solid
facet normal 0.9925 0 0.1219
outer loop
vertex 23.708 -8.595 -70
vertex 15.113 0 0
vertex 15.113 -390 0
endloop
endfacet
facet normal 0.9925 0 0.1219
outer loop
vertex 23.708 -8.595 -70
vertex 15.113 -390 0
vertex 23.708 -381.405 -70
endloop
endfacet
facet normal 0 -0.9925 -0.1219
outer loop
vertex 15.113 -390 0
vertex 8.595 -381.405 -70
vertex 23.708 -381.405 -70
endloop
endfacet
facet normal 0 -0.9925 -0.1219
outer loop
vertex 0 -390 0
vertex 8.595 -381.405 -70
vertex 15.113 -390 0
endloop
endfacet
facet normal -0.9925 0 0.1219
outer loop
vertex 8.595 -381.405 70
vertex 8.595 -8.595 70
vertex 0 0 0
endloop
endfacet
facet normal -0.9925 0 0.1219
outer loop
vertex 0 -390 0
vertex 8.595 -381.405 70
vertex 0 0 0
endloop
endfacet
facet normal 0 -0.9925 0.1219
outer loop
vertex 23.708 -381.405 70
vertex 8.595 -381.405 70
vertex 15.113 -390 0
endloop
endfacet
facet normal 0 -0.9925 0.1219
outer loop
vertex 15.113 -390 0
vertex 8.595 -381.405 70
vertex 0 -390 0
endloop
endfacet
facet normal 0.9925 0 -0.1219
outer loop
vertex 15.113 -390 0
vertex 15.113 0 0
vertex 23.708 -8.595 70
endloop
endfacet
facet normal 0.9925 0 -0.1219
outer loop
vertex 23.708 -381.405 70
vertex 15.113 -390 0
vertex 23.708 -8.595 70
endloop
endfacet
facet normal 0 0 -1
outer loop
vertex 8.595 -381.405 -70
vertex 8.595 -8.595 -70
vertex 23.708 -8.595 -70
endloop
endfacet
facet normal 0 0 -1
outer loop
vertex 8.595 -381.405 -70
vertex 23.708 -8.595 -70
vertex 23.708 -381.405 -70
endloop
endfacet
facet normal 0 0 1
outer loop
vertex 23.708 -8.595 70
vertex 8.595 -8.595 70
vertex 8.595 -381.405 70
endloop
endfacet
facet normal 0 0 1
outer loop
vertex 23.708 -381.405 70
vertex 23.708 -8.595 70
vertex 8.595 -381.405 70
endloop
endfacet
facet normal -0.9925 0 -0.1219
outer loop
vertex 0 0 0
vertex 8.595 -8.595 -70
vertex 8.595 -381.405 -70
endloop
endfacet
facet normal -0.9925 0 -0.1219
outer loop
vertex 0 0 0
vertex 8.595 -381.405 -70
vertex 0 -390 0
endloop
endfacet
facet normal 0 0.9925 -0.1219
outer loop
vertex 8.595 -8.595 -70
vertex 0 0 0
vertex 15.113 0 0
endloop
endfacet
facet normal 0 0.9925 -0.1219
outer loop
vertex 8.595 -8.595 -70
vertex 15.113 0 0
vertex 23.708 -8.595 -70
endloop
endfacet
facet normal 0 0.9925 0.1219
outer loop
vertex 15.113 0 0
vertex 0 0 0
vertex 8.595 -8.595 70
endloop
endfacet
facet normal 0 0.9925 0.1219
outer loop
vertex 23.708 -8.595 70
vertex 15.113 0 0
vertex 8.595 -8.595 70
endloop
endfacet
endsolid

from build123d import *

# Parameters (mm, degrees)
F1_DEPTH = 460
F3_DEPTH = 37.493171


with BuildPart() as f1:
    # F0 (on Front) → F1 (new body)
    with BuildSketch(Plane.XZ):
        Polygon((0, 0), (15.112647, 0), (37.492171, 182.266595), (22.603979, 184.094635), align=None)
    extrude(amount=F1_DEPTH)

    # F2 (on Right) → F3 (intersect, through all)
    with BuildSketch(Plane.YZ):
        Polygon((-390, 0), (0, 0), (-8.594919, 70), (-381.405081, 70), align=None)
    extrude(amount=F3_DEPTH, mode=Mode.INTERSECT)

    # F4: F1 across face


with BuildPart() as f1_1:
    add(f1.part)
    add(f1.part.mirror(Plane(origin=(7.556324, -195, 0), x_dir=(1, 0, 0), z_dir=(0, 0, -1))))


solid = f1_1.part
